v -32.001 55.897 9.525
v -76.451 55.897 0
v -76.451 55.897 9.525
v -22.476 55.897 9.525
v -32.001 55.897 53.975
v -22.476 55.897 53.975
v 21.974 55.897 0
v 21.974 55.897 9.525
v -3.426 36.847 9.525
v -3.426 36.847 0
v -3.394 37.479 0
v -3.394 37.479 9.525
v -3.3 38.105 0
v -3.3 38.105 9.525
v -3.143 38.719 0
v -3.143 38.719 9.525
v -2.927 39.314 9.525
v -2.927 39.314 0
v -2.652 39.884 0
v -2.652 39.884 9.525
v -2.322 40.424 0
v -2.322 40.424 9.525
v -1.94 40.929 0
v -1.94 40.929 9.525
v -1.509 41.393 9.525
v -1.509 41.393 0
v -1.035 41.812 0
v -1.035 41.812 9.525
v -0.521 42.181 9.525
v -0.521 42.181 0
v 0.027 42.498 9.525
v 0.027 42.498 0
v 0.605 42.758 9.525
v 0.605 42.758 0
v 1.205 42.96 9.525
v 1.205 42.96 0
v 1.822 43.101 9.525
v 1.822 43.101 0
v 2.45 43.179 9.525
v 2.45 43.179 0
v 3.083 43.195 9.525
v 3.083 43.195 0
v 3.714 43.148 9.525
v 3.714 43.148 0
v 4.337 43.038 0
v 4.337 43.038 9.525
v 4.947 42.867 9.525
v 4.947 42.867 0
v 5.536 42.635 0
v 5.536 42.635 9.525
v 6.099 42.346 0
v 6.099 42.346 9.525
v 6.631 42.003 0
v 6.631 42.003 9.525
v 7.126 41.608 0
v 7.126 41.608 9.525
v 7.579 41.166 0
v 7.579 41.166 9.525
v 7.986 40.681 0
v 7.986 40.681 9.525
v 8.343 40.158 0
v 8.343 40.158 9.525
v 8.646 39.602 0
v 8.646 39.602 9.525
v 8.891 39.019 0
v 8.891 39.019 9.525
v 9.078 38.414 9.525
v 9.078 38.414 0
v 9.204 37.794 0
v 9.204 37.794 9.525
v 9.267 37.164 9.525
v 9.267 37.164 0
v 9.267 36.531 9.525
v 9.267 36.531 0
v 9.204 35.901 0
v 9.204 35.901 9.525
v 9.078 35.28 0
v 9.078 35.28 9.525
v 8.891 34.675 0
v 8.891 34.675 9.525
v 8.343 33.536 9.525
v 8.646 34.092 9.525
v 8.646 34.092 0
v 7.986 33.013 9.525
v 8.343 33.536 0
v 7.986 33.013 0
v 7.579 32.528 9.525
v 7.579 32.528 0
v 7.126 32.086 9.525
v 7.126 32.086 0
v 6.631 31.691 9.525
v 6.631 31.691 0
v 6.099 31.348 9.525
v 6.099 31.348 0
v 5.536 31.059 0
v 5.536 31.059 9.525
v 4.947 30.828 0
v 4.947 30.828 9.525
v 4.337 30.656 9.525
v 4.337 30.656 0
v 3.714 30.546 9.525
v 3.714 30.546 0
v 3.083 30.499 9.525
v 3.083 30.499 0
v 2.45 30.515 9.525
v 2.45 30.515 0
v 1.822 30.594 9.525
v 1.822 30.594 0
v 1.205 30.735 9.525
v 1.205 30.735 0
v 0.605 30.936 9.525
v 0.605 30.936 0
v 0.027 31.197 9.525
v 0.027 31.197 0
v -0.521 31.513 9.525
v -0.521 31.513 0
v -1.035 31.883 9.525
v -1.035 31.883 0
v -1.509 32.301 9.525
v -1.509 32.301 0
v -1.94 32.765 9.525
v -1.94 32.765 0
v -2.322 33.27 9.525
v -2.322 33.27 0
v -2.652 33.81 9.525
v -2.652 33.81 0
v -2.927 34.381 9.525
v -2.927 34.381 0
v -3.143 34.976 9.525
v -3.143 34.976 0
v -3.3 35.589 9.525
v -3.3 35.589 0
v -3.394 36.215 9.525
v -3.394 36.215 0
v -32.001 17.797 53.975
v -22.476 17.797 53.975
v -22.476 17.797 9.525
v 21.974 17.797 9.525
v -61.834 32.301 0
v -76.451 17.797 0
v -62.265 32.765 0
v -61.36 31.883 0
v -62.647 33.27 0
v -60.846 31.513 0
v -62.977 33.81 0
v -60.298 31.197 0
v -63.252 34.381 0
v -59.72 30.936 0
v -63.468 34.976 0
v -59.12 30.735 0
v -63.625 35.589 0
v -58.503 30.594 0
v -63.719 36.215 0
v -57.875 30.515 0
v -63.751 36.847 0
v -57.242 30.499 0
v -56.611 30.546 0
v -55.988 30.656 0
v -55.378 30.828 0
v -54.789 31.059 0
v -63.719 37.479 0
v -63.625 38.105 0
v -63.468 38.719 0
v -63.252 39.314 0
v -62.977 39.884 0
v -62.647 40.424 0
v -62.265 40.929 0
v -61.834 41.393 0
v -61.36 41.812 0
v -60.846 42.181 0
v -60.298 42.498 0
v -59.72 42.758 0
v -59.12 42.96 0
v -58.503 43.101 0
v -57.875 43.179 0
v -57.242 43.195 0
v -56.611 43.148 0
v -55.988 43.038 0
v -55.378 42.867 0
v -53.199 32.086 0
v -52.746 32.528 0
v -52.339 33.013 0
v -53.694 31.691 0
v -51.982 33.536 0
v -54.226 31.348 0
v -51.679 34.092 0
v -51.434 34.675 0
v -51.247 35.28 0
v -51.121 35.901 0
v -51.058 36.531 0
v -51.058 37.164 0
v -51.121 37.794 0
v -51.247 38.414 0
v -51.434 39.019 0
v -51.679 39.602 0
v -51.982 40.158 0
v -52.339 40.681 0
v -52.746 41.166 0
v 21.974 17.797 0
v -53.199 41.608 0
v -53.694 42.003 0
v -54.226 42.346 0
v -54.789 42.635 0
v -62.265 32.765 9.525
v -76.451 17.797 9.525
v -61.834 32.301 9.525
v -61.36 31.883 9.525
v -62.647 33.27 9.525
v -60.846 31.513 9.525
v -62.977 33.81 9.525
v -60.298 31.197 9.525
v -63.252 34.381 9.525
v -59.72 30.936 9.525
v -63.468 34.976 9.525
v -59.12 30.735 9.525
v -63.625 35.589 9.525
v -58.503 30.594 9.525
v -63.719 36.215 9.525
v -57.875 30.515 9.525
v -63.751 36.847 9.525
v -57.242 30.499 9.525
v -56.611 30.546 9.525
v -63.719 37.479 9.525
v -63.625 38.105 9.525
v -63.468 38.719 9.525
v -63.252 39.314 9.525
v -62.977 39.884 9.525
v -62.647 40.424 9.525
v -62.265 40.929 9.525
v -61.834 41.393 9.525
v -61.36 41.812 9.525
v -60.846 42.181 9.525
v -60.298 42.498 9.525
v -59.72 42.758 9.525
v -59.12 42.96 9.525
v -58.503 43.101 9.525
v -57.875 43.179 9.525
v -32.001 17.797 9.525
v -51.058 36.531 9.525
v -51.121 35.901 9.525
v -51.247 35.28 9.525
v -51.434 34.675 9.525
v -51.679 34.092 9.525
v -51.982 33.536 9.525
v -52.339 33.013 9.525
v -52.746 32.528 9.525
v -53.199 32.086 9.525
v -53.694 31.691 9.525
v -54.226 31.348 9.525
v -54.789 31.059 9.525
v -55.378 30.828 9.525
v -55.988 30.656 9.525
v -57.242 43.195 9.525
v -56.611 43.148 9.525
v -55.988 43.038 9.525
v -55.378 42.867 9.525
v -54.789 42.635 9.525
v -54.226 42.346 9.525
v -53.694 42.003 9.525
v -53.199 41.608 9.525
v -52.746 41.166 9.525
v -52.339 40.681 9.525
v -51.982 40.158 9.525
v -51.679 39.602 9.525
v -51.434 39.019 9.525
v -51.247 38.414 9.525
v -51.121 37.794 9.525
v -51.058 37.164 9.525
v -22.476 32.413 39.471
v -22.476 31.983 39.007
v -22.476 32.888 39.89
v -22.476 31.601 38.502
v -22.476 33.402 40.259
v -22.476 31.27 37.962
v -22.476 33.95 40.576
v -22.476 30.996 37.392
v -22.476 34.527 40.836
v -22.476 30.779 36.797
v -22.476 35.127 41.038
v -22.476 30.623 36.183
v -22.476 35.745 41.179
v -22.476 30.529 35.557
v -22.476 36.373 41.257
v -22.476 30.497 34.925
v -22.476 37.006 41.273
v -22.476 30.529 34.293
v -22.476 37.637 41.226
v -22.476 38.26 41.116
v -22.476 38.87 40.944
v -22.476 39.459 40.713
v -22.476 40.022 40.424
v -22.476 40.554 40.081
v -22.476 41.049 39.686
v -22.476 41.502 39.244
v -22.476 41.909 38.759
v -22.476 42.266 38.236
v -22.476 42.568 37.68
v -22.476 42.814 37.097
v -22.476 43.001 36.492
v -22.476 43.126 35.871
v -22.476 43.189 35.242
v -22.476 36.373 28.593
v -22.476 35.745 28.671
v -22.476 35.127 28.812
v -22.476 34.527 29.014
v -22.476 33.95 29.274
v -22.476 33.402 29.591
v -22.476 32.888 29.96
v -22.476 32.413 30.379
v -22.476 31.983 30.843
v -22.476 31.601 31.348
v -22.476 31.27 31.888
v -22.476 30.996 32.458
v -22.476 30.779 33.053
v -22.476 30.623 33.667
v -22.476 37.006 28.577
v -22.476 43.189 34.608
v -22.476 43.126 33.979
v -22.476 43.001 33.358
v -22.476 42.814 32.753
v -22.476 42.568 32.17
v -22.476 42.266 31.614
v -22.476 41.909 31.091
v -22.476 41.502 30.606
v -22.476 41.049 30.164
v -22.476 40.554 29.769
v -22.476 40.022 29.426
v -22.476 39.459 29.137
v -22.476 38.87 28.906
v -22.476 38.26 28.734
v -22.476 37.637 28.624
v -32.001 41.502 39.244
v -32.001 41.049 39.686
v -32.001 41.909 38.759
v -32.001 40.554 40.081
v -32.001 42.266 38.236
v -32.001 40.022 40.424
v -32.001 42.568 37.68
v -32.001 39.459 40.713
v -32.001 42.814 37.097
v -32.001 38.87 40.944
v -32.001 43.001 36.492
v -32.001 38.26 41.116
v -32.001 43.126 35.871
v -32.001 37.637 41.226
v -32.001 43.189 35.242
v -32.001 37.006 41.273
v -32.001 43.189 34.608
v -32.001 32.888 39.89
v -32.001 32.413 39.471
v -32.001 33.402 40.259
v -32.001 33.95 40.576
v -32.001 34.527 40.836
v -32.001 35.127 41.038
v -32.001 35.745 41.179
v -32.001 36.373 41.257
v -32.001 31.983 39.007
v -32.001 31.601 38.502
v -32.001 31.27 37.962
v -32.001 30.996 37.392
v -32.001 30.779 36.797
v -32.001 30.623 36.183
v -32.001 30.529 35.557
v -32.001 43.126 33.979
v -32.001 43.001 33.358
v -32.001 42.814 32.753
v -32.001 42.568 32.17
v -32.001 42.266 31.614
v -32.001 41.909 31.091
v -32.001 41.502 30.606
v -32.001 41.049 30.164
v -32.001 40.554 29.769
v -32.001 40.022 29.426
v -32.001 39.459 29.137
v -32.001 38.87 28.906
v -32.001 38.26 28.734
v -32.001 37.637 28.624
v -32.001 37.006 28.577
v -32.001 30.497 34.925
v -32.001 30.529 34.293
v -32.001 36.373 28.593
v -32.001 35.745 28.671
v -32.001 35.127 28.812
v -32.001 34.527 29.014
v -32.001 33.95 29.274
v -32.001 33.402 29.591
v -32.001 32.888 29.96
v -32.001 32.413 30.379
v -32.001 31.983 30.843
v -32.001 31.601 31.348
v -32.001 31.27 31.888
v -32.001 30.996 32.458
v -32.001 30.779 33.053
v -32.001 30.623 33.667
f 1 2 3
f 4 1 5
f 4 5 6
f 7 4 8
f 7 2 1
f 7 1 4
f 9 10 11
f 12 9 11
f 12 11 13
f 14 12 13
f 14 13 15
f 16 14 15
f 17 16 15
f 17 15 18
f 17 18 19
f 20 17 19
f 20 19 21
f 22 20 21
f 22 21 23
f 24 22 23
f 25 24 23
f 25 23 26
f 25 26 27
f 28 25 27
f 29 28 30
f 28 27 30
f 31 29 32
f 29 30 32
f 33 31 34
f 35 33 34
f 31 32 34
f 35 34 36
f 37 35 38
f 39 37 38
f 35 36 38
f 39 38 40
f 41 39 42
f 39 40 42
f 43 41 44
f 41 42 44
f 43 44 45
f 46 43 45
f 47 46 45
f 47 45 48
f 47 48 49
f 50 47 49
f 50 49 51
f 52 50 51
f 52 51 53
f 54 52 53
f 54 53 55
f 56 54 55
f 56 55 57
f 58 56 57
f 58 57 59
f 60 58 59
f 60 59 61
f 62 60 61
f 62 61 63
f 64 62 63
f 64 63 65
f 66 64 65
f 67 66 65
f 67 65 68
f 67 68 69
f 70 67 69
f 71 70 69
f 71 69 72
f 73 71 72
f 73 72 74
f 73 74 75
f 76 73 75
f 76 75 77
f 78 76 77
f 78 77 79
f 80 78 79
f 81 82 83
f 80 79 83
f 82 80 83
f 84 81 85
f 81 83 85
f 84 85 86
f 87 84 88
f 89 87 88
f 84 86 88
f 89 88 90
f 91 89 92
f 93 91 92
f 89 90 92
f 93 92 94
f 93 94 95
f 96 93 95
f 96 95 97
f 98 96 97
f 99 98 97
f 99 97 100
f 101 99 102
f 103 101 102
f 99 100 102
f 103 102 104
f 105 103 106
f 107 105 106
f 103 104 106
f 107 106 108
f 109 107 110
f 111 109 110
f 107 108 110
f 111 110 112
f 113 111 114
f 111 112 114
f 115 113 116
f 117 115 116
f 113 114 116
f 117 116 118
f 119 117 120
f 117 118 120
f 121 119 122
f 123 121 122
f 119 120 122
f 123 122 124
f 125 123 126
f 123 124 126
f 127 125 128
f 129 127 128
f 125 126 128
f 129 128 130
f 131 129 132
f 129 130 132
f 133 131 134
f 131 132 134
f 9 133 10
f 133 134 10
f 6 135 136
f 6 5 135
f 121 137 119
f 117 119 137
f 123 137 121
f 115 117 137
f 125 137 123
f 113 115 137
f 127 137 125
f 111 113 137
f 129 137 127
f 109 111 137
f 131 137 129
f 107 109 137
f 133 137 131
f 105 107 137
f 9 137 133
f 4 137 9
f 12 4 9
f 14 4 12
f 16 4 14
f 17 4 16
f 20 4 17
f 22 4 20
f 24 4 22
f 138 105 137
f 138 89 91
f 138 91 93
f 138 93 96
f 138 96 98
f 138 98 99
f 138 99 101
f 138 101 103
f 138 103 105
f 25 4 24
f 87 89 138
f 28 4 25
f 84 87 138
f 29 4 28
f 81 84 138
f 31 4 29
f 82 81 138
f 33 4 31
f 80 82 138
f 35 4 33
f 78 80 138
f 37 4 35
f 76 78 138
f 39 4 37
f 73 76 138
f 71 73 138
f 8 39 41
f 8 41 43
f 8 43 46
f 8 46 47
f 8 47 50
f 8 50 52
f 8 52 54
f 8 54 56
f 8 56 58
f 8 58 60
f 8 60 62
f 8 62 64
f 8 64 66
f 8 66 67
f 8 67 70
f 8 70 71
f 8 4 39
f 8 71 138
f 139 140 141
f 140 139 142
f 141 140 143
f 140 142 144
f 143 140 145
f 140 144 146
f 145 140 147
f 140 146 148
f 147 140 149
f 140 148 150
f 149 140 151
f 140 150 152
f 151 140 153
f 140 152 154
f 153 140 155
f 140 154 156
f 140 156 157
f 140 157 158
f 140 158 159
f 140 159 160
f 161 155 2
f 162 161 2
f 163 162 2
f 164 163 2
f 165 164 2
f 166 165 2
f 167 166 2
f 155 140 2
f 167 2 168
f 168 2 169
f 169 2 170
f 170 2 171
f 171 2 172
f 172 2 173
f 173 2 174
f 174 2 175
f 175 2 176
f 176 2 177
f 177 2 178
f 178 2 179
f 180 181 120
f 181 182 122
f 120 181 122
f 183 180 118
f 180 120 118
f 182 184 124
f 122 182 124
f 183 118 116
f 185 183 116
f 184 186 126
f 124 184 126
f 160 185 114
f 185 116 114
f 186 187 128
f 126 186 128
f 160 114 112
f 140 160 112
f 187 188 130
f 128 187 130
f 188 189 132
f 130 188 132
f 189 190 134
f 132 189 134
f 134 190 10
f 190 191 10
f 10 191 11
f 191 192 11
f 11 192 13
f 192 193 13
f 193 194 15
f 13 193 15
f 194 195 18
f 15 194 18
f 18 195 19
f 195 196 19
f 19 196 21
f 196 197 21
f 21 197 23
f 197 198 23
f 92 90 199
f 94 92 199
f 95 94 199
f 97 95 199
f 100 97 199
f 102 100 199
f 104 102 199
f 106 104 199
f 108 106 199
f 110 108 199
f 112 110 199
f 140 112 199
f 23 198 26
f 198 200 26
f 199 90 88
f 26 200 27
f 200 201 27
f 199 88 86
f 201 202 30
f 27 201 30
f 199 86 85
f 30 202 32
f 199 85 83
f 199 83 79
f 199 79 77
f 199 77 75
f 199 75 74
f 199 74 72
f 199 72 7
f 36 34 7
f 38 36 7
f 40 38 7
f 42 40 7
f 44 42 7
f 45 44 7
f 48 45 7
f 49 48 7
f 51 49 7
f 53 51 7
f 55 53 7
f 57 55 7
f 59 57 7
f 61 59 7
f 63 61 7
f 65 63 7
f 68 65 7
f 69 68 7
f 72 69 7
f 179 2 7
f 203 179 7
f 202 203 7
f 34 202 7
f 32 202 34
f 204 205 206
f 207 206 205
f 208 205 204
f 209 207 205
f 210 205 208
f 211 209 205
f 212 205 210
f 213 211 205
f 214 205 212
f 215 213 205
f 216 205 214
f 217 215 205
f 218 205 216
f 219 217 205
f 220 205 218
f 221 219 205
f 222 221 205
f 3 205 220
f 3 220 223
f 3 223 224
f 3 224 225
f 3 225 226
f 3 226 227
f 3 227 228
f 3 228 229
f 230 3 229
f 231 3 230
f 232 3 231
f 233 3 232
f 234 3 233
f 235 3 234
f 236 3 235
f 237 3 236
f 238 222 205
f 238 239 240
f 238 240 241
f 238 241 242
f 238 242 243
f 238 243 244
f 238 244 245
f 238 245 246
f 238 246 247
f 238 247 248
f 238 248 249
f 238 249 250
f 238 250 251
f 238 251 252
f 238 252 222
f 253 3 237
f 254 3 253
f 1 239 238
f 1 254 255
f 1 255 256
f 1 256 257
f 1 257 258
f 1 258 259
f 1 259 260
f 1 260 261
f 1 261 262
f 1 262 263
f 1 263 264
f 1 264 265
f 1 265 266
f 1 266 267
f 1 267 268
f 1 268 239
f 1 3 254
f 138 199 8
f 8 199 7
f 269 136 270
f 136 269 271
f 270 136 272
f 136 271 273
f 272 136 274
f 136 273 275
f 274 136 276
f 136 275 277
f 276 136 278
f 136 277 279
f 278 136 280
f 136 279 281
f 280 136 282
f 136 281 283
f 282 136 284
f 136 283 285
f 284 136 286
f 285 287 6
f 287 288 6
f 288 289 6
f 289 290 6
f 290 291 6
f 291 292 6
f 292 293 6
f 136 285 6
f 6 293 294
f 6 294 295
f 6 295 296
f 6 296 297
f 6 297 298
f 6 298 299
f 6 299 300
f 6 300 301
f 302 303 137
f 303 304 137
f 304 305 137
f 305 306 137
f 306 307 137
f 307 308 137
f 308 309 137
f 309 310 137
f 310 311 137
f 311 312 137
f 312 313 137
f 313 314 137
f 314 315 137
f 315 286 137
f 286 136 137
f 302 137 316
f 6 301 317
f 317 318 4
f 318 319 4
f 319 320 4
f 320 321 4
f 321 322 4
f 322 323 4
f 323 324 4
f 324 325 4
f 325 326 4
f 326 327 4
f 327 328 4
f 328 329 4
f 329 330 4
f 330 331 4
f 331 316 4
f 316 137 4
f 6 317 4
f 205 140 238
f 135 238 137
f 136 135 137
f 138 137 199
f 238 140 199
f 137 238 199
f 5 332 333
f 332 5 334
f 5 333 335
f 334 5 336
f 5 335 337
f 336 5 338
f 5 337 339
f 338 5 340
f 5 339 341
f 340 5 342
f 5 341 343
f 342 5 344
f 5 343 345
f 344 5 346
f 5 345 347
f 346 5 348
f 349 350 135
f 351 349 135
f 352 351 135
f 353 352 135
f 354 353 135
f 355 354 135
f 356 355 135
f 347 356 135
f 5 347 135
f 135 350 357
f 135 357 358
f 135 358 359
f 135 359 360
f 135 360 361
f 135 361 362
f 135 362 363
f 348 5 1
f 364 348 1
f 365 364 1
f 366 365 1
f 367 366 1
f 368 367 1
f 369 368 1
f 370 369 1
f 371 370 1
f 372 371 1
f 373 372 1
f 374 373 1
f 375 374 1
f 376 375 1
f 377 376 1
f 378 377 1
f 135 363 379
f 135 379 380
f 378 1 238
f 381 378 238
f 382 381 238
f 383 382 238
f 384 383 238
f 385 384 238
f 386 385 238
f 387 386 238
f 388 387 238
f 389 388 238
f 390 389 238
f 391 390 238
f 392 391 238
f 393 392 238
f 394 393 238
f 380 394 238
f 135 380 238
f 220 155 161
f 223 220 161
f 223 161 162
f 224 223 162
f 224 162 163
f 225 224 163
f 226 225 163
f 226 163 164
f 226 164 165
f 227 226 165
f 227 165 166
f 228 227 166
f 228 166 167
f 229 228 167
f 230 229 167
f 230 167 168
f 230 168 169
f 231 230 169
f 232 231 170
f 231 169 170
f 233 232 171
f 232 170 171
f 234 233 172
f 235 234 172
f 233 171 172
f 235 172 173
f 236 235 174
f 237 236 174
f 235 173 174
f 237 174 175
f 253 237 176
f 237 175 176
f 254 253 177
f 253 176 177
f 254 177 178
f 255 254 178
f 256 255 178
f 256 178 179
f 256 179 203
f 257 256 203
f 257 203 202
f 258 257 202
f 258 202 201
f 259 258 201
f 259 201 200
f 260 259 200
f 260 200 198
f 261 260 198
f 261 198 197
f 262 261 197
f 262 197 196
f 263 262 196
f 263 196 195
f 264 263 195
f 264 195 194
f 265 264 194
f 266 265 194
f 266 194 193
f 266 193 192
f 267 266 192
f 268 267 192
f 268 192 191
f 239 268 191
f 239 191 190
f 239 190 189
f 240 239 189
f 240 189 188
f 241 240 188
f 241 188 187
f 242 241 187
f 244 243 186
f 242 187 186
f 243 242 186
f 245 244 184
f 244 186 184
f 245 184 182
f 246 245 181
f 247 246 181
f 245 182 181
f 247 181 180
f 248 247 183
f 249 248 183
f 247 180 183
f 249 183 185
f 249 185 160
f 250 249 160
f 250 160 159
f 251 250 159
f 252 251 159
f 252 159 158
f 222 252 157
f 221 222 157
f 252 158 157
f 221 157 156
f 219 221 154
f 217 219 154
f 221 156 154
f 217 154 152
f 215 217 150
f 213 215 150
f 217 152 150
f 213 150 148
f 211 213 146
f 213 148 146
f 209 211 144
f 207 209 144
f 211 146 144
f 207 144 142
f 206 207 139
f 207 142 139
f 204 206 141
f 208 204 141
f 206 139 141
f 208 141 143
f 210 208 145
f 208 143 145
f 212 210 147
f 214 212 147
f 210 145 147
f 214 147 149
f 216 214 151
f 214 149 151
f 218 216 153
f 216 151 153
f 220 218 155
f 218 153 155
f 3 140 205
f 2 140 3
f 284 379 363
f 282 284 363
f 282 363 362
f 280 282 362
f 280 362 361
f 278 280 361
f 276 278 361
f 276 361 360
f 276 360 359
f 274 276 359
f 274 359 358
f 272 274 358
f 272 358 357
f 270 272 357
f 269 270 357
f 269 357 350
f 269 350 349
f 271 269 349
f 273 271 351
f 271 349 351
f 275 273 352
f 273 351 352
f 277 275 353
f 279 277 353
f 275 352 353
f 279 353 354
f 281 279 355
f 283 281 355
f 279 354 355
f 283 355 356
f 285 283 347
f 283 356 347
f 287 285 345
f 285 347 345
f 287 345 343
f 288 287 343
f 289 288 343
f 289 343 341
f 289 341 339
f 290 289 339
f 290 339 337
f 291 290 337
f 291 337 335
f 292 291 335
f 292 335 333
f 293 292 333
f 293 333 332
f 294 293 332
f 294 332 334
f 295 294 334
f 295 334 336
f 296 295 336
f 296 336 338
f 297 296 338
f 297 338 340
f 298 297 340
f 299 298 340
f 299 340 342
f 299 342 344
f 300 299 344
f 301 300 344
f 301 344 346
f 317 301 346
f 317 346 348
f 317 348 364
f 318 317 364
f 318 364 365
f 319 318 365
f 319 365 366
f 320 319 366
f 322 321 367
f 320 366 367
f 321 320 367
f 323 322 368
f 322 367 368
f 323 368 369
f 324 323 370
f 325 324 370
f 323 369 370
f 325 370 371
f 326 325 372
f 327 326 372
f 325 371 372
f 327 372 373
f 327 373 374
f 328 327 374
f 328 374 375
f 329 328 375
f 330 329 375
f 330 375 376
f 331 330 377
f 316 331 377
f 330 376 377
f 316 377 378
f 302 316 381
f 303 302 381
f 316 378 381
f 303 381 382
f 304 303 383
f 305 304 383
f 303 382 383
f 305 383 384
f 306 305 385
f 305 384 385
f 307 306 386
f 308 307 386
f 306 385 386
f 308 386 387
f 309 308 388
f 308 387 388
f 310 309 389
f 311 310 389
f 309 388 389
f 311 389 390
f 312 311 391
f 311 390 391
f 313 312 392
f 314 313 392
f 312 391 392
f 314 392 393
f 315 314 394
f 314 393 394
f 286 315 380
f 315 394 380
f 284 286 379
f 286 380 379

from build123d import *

# Parameters (mm, degrees)
F0_W     = 98.425
F0_H     = 38.1
F1_DEPTH = 9.525
F3_D     = 12.7
F5_DEPTH = 44.45
F7_D     = 12.7


with BuildPart() as f1:
    # F0 (on Top) → F1 (new body)
    with BuildSketch(Plane.XY):
        with Locations((-27.238064, 36.847196)):
            Rectangle(F0_W, F0_H)
    extrude(amount=F1_DEPTH)

    # F3 (through all)
    with Locations(Plane.XY.offset(9.525)):
        with Locations((-57.400564, 36.847196), (2.924436, 36.847196)):
            Hole(F3_D / 2)

    # F4 (on face) → F5 (join)
    with BuildSketch(Plane.XY.offset(9.525)):
        Polygon((-32.000564, 17.797196), (-27.238064, 17.797196), (-22.475564, 17.797196), (-22.475564, 55.897196), (-27.238064, 55.897196), (-32.000564, 55.897196), align=None)
    extrude(amount=F5_DEPTH)

    # F7 (through all)
    with Locations(Plane.YZ.offset(-22.475564)):
        with Locations((36.847196, 34.925)):
            Hole(F7_D / 2)


solid = f1.part
